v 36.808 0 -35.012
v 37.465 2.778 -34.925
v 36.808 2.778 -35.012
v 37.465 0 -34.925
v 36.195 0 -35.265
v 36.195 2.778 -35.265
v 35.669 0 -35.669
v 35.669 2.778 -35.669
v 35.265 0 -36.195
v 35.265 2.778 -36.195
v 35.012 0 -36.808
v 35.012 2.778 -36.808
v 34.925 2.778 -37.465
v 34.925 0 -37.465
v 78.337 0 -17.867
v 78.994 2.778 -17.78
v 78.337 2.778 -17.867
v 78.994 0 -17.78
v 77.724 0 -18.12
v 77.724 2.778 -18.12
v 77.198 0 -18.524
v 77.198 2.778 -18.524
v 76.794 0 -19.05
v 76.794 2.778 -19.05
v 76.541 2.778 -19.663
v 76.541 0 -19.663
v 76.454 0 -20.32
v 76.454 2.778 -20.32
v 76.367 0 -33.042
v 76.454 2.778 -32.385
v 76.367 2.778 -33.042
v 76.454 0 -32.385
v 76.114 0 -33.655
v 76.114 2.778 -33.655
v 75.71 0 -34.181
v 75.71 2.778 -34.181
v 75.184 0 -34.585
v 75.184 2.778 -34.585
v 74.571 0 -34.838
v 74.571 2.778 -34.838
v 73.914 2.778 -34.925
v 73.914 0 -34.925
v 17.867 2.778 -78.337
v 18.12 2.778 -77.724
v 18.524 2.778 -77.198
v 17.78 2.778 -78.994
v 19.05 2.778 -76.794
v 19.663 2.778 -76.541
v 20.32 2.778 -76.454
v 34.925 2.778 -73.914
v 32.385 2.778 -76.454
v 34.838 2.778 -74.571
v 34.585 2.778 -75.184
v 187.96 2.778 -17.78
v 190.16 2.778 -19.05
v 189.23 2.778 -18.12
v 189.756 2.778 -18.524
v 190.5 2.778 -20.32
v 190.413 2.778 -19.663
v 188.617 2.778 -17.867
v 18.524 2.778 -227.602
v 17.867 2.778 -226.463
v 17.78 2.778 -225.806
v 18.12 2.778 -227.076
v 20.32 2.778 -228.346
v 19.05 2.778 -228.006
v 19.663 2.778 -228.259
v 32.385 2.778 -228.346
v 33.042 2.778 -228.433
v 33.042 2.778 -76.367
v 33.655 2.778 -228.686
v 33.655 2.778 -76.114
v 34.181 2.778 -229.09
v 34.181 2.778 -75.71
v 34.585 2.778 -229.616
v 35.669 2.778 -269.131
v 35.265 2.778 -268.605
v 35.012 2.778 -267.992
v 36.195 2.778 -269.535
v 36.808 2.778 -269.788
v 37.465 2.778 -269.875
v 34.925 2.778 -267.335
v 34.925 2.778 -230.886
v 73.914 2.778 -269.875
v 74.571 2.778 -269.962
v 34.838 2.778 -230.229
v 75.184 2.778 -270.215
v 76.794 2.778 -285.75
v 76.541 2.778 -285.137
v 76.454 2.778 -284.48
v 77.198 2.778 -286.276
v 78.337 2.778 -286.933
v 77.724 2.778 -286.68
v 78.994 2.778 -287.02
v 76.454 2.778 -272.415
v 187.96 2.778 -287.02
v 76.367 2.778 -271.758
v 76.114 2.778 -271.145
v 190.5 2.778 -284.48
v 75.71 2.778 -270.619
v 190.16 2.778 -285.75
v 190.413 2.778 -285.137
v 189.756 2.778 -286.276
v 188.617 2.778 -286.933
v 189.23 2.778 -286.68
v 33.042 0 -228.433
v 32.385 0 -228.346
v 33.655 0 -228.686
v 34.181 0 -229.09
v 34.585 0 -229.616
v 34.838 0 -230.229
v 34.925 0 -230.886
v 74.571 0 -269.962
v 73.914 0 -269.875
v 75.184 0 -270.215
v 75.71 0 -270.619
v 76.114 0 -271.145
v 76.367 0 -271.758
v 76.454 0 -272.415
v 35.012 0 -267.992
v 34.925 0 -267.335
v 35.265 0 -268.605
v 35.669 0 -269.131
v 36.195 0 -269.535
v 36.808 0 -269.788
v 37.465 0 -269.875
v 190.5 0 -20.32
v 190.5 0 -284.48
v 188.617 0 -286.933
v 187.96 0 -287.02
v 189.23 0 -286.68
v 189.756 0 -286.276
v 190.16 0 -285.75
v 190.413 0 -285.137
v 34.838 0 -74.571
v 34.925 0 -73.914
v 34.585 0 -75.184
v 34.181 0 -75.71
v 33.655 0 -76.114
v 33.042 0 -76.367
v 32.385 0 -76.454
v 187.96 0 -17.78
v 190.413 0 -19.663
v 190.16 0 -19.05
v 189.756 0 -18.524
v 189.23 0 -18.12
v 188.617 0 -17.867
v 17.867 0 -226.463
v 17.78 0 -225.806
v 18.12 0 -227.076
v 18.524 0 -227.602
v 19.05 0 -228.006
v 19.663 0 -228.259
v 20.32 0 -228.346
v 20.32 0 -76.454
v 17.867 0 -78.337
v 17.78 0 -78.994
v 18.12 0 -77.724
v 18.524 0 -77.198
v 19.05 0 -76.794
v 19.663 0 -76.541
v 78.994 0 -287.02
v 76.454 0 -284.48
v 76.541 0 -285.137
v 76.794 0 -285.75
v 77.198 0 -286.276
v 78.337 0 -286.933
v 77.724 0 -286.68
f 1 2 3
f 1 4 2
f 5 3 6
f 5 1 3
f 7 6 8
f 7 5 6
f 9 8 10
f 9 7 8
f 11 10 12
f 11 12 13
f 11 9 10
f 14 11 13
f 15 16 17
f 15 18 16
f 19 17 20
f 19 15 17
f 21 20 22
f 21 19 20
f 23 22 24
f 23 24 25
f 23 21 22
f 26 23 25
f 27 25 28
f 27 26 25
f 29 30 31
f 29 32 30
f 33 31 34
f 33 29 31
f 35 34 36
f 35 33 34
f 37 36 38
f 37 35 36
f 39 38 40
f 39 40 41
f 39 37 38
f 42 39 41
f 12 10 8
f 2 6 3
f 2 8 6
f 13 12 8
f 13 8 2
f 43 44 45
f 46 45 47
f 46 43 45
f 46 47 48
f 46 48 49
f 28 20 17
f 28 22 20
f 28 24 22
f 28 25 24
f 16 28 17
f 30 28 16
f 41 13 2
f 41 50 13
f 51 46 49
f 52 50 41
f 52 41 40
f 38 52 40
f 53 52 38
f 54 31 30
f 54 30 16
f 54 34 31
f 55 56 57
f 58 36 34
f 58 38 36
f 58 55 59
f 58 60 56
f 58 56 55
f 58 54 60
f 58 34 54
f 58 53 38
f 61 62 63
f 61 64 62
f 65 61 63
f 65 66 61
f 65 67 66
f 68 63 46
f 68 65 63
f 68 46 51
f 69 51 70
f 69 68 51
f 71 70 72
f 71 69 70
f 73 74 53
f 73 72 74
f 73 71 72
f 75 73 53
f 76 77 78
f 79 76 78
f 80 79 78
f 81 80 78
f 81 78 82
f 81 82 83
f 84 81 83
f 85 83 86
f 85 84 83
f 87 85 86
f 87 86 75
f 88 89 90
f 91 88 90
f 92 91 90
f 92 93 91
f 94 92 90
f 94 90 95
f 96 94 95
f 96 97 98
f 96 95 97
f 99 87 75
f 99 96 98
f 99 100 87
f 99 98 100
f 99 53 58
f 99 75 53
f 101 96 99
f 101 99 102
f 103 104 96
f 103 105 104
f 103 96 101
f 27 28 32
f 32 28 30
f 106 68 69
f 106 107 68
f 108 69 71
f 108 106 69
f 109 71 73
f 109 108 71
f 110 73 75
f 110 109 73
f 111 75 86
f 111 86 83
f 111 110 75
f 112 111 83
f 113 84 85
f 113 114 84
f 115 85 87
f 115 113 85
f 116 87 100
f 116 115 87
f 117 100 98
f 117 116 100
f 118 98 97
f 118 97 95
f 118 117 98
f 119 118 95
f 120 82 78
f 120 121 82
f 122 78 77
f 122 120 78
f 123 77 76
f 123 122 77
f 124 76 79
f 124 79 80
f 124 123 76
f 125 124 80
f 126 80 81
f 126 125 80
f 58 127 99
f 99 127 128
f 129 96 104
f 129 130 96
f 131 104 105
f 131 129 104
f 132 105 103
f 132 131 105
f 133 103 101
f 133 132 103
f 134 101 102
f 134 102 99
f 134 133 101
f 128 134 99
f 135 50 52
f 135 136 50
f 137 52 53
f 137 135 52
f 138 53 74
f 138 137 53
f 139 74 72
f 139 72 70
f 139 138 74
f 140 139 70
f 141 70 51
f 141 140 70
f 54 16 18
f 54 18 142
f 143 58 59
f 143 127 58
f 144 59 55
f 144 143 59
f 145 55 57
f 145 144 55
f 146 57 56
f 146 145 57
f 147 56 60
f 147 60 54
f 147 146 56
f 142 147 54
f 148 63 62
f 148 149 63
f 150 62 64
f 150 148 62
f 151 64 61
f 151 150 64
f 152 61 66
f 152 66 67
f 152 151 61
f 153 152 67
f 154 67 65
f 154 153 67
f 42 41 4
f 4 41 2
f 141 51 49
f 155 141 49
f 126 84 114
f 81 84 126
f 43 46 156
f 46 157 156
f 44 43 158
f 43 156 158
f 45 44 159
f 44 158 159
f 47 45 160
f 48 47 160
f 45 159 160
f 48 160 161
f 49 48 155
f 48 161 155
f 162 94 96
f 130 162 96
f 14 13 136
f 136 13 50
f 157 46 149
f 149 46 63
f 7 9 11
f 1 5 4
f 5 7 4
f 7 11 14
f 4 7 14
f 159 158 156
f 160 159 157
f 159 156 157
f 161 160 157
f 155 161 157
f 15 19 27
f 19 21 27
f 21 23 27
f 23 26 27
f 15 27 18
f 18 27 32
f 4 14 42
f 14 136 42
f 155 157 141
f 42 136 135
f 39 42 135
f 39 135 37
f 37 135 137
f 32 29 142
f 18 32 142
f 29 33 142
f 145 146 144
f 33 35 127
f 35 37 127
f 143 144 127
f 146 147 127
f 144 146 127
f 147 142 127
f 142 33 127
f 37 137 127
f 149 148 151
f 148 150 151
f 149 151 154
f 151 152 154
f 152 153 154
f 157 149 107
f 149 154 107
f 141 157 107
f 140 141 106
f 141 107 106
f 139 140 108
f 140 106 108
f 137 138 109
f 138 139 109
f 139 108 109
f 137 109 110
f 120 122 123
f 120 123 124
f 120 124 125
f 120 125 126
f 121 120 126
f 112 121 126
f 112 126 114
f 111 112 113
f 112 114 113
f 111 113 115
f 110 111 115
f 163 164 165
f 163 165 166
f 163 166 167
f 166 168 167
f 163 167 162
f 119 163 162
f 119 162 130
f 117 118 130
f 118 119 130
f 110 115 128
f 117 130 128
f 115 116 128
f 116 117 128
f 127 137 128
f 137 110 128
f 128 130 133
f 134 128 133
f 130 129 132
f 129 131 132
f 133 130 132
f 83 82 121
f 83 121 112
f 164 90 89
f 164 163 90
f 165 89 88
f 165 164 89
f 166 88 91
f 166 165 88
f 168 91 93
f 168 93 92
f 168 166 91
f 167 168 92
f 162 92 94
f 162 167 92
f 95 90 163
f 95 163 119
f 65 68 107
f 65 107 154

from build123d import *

# Parameters (mm, degrees)
SKETCH1_W           = 190.5
SKETCH1_H           = 304.8
BOSS_EXTRUDE1_DEPTH = 2.778125
SKETCH2_W           = 190.5
SKETCH2_H           = 17.78
CUT_EXTRUDE1_DEPTH  = 3.778125
SKETCH3_W           = 17.78
SKETCH3_H           = 269.24
CUT_EXTRUDE2_DEPTH  = 3.778125
CUT_EXTRUDE3_DEPTH  = 3.778125
FILLET1_R           = 2.54


with BuildPart() as part:
    # Sketch1 → Boss-Extrude1 (new body)
    with BuildSketch(Plane(origin=(0, 0, 0), x_dir=(1, 0, 0), z_dir=(0, 1, 0))):
        with Locations((95.25, 152.4)):
            Rectangle(SKETCH1_W, SKETCH1_H)
    extrude(amount=BOSS_EXTRUDE1_DEPTH)

    # Sketch2 → Cut-Extrude1 (cut, through all)
    with BuildSketch(Plane(origin=(0, 2.778125, 0), x_dir=(1, 0, 0), z_dir=(0, 1, 0))):
        with Locations((95.25, 8.89)):
            Rectangle(SKETCH2_W, SKETCH2_H)
        with Locations((95.25, 295.91)):
            Rectangle(SKETCH2_W, SKETCH2_H)
    extrude(amount=-CUT_EXTRUDE1_DEPTH, mode=Mode.SUBTRACT)

    # Sketch3 → Cut-Extrude2 (cut, through all)
    with BuildSketch(Plane(origin=(0, 2.778125, 0), x_dir=(1, 0, 0), z_dir=(0, 1, 0))):
        with Locations((8.89, 152.4)):
            Rectangle(SKETCH3_W, SKETCH3_H)
    extrude(amount=-CUT_EXTRUDE2_DEPTH, mode=Mode.SUBTRACT)

    # Sketch4 → Cut-Extrude3 (cut, through all)
    with BuildSketch(Plane(origin=(0, 2.778125, 0), x_dir=(1, 0, 0), z_dir=(0, 1, 0))):
        Polygon((17.78, 287.02), (76.454, 287.02), (76.454, 269.875), (34.925, 269.875), (34.925, 228.346), (17.78, 228.346), align=None)
        Polygon((17.78, 17.78), (76.454, 17.78), (76.454, 34.925), (34.925, 34.925), (34.925, 76.454), (17.78, 76.454), align=None)
    extrude(amount=-CUT_EXTRUDE3_DEPTH, mode=Mode.SUBTRACT)

    # Fillet1
    fillet1_edges = [part.edges().sort_by_distance(p)[0] for p in [
        (190.5, 1.3890625, -17.78),
        (190.5, 1.3890625, -287.02),
        (17.78, 1.3890625, -228.346),
        (76.454, 1.3890625, -287.02),
        (76.454, 1.3890625, -269.875),
        (34.925, 1.3890625, -269.875),
        (34.925, 1.3890625, -228.346),
        (17.78, 1.3890625, -76.454),
        (34.925, 1.3890625, -76.454),
        (34.925, 1.3890625, -34.925),
        (76.454, 1.3890625, -34.925),
        (76.454, 1.3890625, -17.78),
    ]]
    fillet(fillet1_edges, radius=FILLET1_R)


solid = part.part
